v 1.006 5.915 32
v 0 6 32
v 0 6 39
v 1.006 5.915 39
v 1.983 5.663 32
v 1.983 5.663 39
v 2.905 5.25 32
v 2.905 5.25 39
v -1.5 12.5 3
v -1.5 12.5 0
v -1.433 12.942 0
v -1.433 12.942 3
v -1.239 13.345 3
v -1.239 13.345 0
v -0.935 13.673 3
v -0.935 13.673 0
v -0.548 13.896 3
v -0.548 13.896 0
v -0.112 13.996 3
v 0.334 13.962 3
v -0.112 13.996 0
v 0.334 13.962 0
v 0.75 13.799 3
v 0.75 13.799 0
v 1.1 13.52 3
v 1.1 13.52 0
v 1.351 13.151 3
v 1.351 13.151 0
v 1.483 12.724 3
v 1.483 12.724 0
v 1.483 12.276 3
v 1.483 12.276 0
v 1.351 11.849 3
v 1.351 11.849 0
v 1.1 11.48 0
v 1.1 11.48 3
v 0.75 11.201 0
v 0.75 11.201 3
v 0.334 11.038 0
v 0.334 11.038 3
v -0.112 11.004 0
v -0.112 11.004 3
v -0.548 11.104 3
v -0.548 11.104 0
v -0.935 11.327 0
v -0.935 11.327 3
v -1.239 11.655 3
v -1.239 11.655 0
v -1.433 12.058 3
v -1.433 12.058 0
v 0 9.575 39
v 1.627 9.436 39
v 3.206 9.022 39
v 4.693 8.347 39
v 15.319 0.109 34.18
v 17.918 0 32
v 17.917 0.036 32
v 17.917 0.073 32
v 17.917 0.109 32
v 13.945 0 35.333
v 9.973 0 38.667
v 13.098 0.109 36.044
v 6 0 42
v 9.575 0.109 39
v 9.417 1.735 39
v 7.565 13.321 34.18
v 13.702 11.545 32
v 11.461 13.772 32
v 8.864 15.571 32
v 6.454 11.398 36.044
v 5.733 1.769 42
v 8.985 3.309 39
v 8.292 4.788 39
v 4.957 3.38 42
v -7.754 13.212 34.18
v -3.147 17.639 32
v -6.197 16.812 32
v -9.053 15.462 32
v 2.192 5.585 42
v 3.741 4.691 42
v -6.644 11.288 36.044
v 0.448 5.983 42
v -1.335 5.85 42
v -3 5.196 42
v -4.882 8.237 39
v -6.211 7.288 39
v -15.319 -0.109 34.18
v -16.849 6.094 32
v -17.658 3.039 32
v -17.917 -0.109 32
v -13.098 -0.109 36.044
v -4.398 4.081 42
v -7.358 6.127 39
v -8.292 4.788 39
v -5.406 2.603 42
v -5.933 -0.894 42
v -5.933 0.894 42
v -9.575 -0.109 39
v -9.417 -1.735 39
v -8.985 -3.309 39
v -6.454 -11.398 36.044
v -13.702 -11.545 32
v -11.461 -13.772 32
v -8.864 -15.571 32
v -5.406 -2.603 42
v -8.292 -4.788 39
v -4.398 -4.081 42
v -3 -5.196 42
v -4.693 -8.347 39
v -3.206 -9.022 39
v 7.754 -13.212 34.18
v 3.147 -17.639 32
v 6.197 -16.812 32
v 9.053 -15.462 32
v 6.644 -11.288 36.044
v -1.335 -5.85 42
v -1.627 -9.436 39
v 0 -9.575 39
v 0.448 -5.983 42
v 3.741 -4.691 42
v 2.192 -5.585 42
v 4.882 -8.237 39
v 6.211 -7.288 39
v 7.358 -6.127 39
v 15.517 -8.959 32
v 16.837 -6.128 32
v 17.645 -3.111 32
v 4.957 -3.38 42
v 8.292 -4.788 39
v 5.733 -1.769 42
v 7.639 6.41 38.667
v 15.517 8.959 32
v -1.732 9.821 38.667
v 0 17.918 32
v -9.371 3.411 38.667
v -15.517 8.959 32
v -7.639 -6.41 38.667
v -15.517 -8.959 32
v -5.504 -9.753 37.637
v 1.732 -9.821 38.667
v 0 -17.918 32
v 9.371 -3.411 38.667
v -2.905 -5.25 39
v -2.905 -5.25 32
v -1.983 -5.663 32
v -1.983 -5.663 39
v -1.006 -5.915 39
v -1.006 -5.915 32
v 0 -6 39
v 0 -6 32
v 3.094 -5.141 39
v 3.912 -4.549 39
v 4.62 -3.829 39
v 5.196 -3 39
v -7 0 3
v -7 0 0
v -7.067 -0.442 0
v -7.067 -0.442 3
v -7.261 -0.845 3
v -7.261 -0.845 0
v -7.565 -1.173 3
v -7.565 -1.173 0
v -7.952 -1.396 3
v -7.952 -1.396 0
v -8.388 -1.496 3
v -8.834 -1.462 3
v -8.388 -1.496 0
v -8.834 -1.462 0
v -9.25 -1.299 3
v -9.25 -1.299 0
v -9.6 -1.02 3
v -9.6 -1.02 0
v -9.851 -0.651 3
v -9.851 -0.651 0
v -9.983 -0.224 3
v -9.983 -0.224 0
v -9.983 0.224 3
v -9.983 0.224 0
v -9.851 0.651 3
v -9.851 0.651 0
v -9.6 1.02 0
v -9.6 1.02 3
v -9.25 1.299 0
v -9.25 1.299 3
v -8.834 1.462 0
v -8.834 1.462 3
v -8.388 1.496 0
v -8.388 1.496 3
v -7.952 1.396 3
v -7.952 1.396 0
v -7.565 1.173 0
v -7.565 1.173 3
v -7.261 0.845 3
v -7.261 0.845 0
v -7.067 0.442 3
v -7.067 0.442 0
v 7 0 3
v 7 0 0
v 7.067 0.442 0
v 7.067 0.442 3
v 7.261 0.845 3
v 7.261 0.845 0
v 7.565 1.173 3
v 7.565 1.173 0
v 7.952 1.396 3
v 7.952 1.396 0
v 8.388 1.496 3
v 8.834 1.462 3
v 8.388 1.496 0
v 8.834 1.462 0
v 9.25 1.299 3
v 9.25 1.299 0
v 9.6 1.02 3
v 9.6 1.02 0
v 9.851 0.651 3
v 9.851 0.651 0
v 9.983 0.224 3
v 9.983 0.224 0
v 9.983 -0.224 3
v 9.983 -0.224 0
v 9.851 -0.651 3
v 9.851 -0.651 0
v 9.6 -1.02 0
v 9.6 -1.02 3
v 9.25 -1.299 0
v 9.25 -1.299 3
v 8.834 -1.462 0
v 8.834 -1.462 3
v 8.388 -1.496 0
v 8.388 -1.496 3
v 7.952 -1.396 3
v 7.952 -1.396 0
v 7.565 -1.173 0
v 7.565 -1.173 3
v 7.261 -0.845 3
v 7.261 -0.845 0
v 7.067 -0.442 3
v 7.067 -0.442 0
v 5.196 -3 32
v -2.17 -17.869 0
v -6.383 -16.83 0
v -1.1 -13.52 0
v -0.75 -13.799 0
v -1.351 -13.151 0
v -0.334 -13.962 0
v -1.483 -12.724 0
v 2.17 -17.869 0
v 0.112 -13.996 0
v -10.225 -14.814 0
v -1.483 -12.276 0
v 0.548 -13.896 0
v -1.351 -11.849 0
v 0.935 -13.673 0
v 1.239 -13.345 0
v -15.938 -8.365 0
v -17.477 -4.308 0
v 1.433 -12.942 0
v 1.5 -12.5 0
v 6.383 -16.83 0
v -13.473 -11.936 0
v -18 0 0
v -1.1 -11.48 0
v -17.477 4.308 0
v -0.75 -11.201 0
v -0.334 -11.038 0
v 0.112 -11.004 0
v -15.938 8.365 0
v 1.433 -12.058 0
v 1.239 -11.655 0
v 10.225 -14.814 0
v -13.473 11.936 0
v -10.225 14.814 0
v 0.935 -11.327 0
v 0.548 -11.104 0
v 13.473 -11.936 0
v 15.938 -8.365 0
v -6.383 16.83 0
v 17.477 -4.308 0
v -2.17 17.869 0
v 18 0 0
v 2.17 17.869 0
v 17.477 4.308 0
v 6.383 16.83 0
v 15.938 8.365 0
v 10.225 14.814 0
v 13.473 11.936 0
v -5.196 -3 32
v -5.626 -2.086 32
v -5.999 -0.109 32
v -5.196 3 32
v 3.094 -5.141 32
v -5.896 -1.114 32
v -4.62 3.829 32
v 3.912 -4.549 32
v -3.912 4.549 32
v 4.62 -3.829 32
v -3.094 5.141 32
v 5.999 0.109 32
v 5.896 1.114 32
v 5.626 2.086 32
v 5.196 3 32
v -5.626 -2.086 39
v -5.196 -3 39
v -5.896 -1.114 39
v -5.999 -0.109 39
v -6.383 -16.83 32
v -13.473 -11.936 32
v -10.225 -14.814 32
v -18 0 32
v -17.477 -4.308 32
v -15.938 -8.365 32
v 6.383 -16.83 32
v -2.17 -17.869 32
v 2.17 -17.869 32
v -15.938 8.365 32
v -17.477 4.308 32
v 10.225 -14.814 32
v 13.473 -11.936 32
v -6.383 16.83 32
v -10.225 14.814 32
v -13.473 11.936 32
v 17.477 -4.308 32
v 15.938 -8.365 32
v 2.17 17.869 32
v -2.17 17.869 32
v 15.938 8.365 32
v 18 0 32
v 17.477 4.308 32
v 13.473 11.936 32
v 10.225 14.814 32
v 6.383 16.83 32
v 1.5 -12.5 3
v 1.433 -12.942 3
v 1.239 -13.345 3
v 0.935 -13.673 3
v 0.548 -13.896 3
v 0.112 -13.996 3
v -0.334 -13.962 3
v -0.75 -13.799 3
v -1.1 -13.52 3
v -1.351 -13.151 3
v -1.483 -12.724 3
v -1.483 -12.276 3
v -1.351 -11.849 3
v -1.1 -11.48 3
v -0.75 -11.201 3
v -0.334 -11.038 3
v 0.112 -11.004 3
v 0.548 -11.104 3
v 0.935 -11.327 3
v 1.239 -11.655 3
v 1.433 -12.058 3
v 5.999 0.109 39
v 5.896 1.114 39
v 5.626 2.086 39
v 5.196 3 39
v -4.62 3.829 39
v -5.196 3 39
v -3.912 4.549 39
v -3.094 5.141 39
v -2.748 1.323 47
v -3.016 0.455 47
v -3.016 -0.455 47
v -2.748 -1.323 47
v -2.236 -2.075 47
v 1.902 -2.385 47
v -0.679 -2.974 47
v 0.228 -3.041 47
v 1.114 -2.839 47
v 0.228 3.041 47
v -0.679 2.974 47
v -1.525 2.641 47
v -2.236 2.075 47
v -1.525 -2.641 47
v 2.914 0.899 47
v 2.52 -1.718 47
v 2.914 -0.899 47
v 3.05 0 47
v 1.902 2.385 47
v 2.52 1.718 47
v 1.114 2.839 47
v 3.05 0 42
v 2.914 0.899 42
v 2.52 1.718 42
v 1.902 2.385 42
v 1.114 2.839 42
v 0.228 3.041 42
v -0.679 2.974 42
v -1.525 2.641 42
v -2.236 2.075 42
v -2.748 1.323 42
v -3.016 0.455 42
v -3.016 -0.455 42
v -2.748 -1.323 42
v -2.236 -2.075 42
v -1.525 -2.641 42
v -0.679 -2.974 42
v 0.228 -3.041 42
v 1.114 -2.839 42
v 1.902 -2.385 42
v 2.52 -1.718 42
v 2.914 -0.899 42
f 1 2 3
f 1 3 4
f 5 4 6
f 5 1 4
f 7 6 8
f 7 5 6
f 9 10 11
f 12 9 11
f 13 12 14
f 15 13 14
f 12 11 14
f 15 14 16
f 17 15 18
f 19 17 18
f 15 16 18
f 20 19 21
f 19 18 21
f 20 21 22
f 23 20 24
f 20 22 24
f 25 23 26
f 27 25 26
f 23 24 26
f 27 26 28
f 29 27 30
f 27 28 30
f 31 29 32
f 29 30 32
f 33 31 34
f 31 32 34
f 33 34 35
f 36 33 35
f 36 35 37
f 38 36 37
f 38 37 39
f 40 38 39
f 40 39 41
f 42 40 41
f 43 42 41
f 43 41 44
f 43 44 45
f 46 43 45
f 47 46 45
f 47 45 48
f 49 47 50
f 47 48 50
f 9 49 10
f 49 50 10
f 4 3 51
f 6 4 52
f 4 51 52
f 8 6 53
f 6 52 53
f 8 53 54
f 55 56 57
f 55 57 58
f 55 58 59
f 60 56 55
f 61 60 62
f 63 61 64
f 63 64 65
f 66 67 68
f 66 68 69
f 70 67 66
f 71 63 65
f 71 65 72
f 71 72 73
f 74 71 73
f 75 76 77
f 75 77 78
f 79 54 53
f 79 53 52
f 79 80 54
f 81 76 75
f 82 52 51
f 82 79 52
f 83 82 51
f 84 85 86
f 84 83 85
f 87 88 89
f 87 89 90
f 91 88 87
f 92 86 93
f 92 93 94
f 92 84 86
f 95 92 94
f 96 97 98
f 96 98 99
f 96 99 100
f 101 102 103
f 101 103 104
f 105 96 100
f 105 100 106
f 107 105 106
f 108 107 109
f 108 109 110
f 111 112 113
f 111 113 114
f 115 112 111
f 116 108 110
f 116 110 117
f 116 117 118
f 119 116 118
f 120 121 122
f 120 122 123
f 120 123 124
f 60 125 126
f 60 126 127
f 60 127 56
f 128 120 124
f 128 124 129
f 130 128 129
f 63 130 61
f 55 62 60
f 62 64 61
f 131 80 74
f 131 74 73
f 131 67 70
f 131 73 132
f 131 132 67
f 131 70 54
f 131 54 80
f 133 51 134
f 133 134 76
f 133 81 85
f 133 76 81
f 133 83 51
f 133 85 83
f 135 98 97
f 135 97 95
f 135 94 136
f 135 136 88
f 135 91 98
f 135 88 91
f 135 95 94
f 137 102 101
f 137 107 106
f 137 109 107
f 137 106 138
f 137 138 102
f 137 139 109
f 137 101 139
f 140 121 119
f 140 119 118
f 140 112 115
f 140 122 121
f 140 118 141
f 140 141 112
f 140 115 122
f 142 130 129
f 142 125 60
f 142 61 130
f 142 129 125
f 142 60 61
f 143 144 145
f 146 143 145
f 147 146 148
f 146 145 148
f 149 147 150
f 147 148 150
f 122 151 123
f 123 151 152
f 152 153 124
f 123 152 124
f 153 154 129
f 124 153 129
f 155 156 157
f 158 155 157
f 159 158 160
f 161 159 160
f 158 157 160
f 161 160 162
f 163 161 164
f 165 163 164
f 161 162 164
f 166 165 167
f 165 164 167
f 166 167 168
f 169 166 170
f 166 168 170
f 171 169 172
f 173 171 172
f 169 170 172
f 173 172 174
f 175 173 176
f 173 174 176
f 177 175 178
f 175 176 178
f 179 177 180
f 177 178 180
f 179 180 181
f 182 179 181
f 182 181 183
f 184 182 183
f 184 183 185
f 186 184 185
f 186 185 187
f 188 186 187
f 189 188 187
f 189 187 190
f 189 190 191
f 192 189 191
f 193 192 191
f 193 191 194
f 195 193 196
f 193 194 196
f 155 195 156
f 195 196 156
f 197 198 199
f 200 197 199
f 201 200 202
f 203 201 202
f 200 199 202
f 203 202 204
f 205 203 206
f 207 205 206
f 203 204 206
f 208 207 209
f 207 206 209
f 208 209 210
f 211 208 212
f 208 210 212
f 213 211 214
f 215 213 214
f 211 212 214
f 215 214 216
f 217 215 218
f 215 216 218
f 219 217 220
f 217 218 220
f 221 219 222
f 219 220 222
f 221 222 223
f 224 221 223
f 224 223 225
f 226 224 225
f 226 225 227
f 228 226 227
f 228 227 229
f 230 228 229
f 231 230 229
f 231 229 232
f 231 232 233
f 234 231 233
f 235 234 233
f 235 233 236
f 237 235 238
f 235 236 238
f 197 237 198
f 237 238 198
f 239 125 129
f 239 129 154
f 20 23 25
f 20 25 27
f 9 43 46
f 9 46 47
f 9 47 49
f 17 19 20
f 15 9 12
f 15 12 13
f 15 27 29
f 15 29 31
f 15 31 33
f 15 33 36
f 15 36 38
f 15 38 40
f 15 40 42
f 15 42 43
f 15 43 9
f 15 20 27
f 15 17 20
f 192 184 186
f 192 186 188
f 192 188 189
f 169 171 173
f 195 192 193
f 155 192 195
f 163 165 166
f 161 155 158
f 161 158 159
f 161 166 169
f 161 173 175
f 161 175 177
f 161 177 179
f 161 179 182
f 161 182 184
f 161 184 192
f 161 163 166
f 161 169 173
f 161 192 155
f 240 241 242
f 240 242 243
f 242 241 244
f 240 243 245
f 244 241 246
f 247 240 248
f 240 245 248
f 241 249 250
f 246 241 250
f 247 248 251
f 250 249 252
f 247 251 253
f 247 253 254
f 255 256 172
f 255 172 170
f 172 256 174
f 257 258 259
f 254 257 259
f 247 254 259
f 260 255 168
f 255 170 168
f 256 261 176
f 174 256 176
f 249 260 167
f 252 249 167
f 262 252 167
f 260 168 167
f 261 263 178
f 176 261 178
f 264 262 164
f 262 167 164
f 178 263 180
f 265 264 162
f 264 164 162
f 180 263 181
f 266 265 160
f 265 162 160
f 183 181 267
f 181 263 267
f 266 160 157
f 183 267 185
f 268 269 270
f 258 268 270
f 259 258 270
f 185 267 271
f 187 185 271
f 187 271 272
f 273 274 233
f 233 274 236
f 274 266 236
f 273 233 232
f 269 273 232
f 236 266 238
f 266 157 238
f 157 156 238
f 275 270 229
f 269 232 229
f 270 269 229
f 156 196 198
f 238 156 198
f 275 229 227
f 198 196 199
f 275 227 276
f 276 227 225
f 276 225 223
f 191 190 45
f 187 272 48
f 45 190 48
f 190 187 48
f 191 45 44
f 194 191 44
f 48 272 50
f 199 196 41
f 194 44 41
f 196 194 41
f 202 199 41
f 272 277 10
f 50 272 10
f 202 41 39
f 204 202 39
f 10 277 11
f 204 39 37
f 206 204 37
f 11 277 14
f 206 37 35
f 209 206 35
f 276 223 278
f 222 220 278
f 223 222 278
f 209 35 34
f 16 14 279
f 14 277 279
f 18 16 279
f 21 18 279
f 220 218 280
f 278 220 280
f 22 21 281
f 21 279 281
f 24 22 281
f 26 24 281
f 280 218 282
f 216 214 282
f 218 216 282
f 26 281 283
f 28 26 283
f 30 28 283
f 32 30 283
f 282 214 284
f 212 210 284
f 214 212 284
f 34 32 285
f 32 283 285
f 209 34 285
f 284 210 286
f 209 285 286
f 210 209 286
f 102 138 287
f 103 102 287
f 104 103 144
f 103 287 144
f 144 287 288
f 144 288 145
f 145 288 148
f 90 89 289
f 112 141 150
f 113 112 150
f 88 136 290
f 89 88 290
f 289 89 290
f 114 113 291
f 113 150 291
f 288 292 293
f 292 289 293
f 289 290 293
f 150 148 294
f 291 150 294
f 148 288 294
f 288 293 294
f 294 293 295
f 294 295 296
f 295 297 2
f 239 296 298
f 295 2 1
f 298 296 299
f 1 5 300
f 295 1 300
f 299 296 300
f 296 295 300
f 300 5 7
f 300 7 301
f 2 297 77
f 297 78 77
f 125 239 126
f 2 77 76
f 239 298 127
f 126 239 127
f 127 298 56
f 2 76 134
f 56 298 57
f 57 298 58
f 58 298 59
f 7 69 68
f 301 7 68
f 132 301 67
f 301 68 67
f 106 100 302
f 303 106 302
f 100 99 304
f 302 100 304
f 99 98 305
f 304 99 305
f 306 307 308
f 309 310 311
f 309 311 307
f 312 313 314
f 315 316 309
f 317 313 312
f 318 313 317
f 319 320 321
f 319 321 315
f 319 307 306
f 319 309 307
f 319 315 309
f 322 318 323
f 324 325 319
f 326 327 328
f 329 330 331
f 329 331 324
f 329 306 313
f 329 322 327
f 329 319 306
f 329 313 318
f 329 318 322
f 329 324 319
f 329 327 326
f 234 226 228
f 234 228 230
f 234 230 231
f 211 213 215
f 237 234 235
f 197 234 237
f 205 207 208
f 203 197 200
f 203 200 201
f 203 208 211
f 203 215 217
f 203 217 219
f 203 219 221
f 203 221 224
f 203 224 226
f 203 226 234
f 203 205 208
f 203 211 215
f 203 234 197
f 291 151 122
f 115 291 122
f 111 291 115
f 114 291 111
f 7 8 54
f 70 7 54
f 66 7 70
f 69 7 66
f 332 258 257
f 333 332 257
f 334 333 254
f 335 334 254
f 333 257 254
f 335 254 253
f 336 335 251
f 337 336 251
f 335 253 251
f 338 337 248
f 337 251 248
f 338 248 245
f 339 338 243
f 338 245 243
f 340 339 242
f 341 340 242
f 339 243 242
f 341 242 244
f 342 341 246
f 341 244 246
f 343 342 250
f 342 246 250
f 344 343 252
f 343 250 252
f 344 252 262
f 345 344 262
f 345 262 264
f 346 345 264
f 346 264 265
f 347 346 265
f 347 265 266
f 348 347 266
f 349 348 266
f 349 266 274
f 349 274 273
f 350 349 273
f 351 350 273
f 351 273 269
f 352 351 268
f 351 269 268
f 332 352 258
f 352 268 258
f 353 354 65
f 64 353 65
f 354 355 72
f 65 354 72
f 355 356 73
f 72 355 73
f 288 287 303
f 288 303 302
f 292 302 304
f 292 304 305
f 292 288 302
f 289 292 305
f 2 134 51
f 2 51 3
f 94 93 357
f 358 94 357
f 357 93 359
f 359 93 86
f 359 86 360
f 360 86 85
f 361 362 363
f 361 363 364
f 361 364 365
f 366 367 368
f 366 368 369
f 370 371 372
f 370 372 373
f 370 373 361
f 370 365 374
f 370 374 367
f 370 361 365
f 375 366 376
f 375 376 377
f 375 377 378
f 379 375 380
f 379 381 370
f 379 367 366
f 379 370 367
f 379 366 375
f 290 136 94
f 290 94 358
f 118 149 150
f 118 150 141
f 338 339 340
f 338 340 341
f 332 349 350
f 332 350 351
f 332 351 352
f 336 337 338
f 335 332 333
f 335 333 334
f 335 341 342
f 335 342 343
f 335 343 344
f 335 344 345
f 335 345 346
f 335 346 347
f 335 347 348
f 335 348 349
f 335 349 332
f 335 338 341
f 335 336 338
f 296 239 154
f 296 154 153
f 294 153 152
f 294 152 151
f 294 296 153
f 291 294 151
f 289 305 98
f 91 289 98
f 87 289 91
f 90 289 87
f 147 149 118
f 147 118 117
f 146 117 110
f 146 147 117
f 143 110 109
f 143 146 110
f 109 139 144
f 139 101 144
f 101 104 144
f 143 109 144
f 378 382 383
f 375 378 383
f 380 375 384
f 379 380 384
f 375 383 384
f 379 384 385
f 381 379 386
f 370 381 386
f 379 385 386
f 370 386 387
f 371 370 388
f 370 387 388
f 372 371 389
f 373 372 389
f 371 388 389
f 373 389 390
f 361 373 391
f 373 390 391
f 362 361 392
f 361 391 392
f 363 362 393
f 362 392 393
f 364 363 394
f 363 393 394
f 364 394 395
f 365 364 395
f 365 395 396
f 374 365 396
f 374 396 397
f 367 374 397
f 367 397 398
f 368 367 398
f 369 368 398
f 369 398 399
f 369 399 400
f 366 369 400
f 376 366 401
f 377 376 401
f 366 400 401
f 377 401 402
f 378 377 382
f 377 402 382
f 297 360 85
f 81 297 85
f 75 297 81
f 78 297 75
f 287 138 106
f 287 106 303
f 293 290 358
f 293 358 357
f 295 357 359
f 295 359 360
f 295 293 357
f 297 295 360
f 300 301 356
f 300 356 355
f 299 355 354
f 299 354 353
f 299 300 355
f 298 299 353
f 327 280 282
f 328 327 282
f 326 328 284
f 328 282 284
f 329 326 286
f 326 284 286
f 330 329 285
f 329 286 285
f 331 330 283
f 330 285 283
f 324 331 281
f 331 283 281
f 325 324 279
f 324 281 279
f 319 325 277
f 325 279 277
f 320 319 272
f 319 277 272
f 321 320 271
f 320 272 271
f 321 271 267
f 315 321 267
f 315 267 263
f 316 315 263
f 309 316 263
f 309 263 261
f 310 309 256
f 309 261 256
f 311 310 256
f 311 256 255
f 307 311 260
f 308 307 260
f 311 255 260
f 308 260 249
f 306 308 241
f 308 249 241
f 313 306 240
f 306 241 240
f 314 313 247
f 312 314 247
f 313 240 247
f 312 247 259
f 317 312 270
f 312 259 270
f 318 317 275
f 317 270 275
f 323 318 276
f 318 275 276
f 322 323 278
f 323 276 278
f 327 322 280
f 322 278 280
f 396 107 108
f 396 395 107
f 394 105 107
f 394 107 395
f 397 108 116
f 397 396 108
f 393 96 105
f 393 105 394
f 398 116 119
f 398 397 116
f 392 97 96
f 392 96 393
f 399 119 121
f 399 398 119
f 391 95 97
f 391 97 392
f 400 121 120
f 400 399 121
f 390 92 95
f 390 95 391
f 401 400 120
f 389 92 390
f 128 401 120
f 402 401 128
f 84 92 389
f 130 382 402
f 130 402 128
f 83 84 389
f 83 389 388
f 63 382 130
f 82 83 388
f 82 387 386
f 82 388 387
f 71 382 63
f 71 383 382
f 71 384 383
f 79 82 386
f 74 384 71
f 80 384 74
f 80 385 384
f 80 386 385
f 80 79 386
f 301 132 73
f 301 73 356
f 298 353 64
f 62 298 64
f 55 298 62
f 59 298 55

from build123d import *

# Parameters (mm, degrees)
SKETCH_1_R          = 18
EXTRUDE_1_DEPTH     = 32
SKETCH_2_R          = 1.5
CUT_EXTRUDE_1_DEPTH = 3
SKETCH_5_R          = 6
EXTRUDE_5_DEPTH     = 10
EXTRUDE_5_DRAFT     = 50
CUT_EXTRUDE_2_DEPTH = 7
SKETCH_8_R          = 3.05
EXTRUDE_6_DEPTH     = 5


with BuildPart() as part:
    # 草图1 → 凸台-拉伸1 (new body)
    with BuildSketch(Plane.XY):
        Circle(SKETCH_1_R)
    extrude(amount=EXTRUDE_1_DEPTH)

    # 草图2 → 切除-拉伸1 (cut)
    with BuildSketch(Plane(origin=(0, 0, 0), x_dir=(-1, 0, 0), z_dir=(0, 0, -1))):
        with Locations((-8.5, 0)):
            Circle(SKETCH_2_R)
        with Locations(Location((8.5, 0, 0), (0, 0, 180))):
            Circle(SKETCH_2_R)
        with Locations((0, 12.5)):
            Circle(SKETCH_2_R)
        with Locations(Location((0, -12.5, 0), (0, 0, 180))):
            Circle(SKETCH_2_R)
    extrude(amount=-CUT_EXTRUDE_1_DEPTH, mode=Mode.SUBTRACT)


with BuildPart() as body_2:
    # 草图5 → 凸台-拉伸5 (with draft: the straight prism first)
    with BuildSketch(Plane.XY.offset(42)):
        Circle(SKETCH_5_R)
    extrude(amount=-EXTRUDE_5_DEPTH)
    # 凸台-拉伸5: the draft: its side faces are tilted about the plane it starts from
    extrude_5_sides = [body_2.faces().sort_by_distance(p)[0] for p in [
        (-6, 0, 37),
    ]]
    draft(extrude_5_sides, Plane.XY.offset(42), EXTRUDE_5_DRAFT)

    # 草图7 → 切除-拉伸2 (cut)
    with BuildSketch(Plane(origin=(0, 0, 32), x_dir=(-1, 0, 0), z_dir=(0, 0, -1))):
        with BuildLine():
            Line((0, -6), (0, -17.917535926))
            ThreePointArc((0, -17.917535926), (4.584530168, -17.32109052), (8.863837345, -15.571463682))
            Line((8.863837345, -15.571463682), (2.90473751, -5.25))
            ThreePointArc((2.90473751, -5.25), (1.5, -5.809475019), (0, -6))
        make_face()
        with BuildLine():
            Line((-3.094264615, -5.140576475), (-9.05336445, -15.462040156))
            ThreePointArc((-9.05336445, -15.462040156), (-12.708239327, -12.63086485), (-15.517041285, -8.958767963))
            Line((-15.517041285, -8.958767963), (-5.196152423, -3))
            ThreePointArc((-5.196152423, -3), (-4.281152949, -4.203775615), (-3.094264615, -5.140576475))
        make_face()
        with BuildLine():
            Line((-5.999002125, 0.109423525), (-17.917201795, 0.109423525))
            ThreePointArc((-17.917201795, 0.109423525), (-17.292769495, 4.69022567), (-15.517041285, 8.958767963))
            Line((-15.517041285, 8.958767963), (-5.196152423, 3))
            ThreePointArc((-5.196152423, 3), (-5.781152949, 1.605699404), (-5.999002125, 0.109423525))
        make_face()
        with BuildLine():
            Line((-2.90473751, 5.25), (-8.863837345, 15.571463682))
            ThreePointArc((-8.863837345, 15.571463682), (-4.584530168, 17.32109052), (0, 17.917535926))
            Line((0, 17.917535926), (0, 6))
            ThreePointArc((0, 6), (-1.5, 5.809475019), (-2.90473751, 5.25))
        make_face()
        with BuildLine():
            Line((3.094264615, 5.140576475), (9.05336445, 15.462040156))
            ThreePointArc((9.05336445, 15.462040156), (12.708239327, 12.63086485), (15.517041285, 8.958767963))
            Line((15.517041285, 8.958767963), (5.196152423, 3))
            ThreePointArc((5.196152423, 3), (4.281152949, 4.203775615), (3.094264615, 5.140576475))
        make_face()
        with BuildLine():
            Line((5.999002125, -0.109423525), (17.917201795, -0.109423525))
            ThreePointArc((17.917201795, -0.109423525), (17.292769495, -4.69022567), (15.517041285, -8.958767963))
            Line((15.517041285, -8.958767963), (5.196152423, -3))
            ThreePointArc((5.196152423, -3), (5.781152949, -1.605699404), (5.999002125, -0.109423525))
        make_face()
    extrude(amount=-CUT_EXTRUDE_2_DEPTH, mode=Mode.SUBTRACT)

    # 草图8 → 凸台-拉伸6 (add)
    with BuildSketch(Plane.XY.offset(42)):
        Circle(SKETCH_8_R)
    extrude(amount=EXTRUDE_6_DEPTH)


solid = Compound([part.part, body_2.part])
